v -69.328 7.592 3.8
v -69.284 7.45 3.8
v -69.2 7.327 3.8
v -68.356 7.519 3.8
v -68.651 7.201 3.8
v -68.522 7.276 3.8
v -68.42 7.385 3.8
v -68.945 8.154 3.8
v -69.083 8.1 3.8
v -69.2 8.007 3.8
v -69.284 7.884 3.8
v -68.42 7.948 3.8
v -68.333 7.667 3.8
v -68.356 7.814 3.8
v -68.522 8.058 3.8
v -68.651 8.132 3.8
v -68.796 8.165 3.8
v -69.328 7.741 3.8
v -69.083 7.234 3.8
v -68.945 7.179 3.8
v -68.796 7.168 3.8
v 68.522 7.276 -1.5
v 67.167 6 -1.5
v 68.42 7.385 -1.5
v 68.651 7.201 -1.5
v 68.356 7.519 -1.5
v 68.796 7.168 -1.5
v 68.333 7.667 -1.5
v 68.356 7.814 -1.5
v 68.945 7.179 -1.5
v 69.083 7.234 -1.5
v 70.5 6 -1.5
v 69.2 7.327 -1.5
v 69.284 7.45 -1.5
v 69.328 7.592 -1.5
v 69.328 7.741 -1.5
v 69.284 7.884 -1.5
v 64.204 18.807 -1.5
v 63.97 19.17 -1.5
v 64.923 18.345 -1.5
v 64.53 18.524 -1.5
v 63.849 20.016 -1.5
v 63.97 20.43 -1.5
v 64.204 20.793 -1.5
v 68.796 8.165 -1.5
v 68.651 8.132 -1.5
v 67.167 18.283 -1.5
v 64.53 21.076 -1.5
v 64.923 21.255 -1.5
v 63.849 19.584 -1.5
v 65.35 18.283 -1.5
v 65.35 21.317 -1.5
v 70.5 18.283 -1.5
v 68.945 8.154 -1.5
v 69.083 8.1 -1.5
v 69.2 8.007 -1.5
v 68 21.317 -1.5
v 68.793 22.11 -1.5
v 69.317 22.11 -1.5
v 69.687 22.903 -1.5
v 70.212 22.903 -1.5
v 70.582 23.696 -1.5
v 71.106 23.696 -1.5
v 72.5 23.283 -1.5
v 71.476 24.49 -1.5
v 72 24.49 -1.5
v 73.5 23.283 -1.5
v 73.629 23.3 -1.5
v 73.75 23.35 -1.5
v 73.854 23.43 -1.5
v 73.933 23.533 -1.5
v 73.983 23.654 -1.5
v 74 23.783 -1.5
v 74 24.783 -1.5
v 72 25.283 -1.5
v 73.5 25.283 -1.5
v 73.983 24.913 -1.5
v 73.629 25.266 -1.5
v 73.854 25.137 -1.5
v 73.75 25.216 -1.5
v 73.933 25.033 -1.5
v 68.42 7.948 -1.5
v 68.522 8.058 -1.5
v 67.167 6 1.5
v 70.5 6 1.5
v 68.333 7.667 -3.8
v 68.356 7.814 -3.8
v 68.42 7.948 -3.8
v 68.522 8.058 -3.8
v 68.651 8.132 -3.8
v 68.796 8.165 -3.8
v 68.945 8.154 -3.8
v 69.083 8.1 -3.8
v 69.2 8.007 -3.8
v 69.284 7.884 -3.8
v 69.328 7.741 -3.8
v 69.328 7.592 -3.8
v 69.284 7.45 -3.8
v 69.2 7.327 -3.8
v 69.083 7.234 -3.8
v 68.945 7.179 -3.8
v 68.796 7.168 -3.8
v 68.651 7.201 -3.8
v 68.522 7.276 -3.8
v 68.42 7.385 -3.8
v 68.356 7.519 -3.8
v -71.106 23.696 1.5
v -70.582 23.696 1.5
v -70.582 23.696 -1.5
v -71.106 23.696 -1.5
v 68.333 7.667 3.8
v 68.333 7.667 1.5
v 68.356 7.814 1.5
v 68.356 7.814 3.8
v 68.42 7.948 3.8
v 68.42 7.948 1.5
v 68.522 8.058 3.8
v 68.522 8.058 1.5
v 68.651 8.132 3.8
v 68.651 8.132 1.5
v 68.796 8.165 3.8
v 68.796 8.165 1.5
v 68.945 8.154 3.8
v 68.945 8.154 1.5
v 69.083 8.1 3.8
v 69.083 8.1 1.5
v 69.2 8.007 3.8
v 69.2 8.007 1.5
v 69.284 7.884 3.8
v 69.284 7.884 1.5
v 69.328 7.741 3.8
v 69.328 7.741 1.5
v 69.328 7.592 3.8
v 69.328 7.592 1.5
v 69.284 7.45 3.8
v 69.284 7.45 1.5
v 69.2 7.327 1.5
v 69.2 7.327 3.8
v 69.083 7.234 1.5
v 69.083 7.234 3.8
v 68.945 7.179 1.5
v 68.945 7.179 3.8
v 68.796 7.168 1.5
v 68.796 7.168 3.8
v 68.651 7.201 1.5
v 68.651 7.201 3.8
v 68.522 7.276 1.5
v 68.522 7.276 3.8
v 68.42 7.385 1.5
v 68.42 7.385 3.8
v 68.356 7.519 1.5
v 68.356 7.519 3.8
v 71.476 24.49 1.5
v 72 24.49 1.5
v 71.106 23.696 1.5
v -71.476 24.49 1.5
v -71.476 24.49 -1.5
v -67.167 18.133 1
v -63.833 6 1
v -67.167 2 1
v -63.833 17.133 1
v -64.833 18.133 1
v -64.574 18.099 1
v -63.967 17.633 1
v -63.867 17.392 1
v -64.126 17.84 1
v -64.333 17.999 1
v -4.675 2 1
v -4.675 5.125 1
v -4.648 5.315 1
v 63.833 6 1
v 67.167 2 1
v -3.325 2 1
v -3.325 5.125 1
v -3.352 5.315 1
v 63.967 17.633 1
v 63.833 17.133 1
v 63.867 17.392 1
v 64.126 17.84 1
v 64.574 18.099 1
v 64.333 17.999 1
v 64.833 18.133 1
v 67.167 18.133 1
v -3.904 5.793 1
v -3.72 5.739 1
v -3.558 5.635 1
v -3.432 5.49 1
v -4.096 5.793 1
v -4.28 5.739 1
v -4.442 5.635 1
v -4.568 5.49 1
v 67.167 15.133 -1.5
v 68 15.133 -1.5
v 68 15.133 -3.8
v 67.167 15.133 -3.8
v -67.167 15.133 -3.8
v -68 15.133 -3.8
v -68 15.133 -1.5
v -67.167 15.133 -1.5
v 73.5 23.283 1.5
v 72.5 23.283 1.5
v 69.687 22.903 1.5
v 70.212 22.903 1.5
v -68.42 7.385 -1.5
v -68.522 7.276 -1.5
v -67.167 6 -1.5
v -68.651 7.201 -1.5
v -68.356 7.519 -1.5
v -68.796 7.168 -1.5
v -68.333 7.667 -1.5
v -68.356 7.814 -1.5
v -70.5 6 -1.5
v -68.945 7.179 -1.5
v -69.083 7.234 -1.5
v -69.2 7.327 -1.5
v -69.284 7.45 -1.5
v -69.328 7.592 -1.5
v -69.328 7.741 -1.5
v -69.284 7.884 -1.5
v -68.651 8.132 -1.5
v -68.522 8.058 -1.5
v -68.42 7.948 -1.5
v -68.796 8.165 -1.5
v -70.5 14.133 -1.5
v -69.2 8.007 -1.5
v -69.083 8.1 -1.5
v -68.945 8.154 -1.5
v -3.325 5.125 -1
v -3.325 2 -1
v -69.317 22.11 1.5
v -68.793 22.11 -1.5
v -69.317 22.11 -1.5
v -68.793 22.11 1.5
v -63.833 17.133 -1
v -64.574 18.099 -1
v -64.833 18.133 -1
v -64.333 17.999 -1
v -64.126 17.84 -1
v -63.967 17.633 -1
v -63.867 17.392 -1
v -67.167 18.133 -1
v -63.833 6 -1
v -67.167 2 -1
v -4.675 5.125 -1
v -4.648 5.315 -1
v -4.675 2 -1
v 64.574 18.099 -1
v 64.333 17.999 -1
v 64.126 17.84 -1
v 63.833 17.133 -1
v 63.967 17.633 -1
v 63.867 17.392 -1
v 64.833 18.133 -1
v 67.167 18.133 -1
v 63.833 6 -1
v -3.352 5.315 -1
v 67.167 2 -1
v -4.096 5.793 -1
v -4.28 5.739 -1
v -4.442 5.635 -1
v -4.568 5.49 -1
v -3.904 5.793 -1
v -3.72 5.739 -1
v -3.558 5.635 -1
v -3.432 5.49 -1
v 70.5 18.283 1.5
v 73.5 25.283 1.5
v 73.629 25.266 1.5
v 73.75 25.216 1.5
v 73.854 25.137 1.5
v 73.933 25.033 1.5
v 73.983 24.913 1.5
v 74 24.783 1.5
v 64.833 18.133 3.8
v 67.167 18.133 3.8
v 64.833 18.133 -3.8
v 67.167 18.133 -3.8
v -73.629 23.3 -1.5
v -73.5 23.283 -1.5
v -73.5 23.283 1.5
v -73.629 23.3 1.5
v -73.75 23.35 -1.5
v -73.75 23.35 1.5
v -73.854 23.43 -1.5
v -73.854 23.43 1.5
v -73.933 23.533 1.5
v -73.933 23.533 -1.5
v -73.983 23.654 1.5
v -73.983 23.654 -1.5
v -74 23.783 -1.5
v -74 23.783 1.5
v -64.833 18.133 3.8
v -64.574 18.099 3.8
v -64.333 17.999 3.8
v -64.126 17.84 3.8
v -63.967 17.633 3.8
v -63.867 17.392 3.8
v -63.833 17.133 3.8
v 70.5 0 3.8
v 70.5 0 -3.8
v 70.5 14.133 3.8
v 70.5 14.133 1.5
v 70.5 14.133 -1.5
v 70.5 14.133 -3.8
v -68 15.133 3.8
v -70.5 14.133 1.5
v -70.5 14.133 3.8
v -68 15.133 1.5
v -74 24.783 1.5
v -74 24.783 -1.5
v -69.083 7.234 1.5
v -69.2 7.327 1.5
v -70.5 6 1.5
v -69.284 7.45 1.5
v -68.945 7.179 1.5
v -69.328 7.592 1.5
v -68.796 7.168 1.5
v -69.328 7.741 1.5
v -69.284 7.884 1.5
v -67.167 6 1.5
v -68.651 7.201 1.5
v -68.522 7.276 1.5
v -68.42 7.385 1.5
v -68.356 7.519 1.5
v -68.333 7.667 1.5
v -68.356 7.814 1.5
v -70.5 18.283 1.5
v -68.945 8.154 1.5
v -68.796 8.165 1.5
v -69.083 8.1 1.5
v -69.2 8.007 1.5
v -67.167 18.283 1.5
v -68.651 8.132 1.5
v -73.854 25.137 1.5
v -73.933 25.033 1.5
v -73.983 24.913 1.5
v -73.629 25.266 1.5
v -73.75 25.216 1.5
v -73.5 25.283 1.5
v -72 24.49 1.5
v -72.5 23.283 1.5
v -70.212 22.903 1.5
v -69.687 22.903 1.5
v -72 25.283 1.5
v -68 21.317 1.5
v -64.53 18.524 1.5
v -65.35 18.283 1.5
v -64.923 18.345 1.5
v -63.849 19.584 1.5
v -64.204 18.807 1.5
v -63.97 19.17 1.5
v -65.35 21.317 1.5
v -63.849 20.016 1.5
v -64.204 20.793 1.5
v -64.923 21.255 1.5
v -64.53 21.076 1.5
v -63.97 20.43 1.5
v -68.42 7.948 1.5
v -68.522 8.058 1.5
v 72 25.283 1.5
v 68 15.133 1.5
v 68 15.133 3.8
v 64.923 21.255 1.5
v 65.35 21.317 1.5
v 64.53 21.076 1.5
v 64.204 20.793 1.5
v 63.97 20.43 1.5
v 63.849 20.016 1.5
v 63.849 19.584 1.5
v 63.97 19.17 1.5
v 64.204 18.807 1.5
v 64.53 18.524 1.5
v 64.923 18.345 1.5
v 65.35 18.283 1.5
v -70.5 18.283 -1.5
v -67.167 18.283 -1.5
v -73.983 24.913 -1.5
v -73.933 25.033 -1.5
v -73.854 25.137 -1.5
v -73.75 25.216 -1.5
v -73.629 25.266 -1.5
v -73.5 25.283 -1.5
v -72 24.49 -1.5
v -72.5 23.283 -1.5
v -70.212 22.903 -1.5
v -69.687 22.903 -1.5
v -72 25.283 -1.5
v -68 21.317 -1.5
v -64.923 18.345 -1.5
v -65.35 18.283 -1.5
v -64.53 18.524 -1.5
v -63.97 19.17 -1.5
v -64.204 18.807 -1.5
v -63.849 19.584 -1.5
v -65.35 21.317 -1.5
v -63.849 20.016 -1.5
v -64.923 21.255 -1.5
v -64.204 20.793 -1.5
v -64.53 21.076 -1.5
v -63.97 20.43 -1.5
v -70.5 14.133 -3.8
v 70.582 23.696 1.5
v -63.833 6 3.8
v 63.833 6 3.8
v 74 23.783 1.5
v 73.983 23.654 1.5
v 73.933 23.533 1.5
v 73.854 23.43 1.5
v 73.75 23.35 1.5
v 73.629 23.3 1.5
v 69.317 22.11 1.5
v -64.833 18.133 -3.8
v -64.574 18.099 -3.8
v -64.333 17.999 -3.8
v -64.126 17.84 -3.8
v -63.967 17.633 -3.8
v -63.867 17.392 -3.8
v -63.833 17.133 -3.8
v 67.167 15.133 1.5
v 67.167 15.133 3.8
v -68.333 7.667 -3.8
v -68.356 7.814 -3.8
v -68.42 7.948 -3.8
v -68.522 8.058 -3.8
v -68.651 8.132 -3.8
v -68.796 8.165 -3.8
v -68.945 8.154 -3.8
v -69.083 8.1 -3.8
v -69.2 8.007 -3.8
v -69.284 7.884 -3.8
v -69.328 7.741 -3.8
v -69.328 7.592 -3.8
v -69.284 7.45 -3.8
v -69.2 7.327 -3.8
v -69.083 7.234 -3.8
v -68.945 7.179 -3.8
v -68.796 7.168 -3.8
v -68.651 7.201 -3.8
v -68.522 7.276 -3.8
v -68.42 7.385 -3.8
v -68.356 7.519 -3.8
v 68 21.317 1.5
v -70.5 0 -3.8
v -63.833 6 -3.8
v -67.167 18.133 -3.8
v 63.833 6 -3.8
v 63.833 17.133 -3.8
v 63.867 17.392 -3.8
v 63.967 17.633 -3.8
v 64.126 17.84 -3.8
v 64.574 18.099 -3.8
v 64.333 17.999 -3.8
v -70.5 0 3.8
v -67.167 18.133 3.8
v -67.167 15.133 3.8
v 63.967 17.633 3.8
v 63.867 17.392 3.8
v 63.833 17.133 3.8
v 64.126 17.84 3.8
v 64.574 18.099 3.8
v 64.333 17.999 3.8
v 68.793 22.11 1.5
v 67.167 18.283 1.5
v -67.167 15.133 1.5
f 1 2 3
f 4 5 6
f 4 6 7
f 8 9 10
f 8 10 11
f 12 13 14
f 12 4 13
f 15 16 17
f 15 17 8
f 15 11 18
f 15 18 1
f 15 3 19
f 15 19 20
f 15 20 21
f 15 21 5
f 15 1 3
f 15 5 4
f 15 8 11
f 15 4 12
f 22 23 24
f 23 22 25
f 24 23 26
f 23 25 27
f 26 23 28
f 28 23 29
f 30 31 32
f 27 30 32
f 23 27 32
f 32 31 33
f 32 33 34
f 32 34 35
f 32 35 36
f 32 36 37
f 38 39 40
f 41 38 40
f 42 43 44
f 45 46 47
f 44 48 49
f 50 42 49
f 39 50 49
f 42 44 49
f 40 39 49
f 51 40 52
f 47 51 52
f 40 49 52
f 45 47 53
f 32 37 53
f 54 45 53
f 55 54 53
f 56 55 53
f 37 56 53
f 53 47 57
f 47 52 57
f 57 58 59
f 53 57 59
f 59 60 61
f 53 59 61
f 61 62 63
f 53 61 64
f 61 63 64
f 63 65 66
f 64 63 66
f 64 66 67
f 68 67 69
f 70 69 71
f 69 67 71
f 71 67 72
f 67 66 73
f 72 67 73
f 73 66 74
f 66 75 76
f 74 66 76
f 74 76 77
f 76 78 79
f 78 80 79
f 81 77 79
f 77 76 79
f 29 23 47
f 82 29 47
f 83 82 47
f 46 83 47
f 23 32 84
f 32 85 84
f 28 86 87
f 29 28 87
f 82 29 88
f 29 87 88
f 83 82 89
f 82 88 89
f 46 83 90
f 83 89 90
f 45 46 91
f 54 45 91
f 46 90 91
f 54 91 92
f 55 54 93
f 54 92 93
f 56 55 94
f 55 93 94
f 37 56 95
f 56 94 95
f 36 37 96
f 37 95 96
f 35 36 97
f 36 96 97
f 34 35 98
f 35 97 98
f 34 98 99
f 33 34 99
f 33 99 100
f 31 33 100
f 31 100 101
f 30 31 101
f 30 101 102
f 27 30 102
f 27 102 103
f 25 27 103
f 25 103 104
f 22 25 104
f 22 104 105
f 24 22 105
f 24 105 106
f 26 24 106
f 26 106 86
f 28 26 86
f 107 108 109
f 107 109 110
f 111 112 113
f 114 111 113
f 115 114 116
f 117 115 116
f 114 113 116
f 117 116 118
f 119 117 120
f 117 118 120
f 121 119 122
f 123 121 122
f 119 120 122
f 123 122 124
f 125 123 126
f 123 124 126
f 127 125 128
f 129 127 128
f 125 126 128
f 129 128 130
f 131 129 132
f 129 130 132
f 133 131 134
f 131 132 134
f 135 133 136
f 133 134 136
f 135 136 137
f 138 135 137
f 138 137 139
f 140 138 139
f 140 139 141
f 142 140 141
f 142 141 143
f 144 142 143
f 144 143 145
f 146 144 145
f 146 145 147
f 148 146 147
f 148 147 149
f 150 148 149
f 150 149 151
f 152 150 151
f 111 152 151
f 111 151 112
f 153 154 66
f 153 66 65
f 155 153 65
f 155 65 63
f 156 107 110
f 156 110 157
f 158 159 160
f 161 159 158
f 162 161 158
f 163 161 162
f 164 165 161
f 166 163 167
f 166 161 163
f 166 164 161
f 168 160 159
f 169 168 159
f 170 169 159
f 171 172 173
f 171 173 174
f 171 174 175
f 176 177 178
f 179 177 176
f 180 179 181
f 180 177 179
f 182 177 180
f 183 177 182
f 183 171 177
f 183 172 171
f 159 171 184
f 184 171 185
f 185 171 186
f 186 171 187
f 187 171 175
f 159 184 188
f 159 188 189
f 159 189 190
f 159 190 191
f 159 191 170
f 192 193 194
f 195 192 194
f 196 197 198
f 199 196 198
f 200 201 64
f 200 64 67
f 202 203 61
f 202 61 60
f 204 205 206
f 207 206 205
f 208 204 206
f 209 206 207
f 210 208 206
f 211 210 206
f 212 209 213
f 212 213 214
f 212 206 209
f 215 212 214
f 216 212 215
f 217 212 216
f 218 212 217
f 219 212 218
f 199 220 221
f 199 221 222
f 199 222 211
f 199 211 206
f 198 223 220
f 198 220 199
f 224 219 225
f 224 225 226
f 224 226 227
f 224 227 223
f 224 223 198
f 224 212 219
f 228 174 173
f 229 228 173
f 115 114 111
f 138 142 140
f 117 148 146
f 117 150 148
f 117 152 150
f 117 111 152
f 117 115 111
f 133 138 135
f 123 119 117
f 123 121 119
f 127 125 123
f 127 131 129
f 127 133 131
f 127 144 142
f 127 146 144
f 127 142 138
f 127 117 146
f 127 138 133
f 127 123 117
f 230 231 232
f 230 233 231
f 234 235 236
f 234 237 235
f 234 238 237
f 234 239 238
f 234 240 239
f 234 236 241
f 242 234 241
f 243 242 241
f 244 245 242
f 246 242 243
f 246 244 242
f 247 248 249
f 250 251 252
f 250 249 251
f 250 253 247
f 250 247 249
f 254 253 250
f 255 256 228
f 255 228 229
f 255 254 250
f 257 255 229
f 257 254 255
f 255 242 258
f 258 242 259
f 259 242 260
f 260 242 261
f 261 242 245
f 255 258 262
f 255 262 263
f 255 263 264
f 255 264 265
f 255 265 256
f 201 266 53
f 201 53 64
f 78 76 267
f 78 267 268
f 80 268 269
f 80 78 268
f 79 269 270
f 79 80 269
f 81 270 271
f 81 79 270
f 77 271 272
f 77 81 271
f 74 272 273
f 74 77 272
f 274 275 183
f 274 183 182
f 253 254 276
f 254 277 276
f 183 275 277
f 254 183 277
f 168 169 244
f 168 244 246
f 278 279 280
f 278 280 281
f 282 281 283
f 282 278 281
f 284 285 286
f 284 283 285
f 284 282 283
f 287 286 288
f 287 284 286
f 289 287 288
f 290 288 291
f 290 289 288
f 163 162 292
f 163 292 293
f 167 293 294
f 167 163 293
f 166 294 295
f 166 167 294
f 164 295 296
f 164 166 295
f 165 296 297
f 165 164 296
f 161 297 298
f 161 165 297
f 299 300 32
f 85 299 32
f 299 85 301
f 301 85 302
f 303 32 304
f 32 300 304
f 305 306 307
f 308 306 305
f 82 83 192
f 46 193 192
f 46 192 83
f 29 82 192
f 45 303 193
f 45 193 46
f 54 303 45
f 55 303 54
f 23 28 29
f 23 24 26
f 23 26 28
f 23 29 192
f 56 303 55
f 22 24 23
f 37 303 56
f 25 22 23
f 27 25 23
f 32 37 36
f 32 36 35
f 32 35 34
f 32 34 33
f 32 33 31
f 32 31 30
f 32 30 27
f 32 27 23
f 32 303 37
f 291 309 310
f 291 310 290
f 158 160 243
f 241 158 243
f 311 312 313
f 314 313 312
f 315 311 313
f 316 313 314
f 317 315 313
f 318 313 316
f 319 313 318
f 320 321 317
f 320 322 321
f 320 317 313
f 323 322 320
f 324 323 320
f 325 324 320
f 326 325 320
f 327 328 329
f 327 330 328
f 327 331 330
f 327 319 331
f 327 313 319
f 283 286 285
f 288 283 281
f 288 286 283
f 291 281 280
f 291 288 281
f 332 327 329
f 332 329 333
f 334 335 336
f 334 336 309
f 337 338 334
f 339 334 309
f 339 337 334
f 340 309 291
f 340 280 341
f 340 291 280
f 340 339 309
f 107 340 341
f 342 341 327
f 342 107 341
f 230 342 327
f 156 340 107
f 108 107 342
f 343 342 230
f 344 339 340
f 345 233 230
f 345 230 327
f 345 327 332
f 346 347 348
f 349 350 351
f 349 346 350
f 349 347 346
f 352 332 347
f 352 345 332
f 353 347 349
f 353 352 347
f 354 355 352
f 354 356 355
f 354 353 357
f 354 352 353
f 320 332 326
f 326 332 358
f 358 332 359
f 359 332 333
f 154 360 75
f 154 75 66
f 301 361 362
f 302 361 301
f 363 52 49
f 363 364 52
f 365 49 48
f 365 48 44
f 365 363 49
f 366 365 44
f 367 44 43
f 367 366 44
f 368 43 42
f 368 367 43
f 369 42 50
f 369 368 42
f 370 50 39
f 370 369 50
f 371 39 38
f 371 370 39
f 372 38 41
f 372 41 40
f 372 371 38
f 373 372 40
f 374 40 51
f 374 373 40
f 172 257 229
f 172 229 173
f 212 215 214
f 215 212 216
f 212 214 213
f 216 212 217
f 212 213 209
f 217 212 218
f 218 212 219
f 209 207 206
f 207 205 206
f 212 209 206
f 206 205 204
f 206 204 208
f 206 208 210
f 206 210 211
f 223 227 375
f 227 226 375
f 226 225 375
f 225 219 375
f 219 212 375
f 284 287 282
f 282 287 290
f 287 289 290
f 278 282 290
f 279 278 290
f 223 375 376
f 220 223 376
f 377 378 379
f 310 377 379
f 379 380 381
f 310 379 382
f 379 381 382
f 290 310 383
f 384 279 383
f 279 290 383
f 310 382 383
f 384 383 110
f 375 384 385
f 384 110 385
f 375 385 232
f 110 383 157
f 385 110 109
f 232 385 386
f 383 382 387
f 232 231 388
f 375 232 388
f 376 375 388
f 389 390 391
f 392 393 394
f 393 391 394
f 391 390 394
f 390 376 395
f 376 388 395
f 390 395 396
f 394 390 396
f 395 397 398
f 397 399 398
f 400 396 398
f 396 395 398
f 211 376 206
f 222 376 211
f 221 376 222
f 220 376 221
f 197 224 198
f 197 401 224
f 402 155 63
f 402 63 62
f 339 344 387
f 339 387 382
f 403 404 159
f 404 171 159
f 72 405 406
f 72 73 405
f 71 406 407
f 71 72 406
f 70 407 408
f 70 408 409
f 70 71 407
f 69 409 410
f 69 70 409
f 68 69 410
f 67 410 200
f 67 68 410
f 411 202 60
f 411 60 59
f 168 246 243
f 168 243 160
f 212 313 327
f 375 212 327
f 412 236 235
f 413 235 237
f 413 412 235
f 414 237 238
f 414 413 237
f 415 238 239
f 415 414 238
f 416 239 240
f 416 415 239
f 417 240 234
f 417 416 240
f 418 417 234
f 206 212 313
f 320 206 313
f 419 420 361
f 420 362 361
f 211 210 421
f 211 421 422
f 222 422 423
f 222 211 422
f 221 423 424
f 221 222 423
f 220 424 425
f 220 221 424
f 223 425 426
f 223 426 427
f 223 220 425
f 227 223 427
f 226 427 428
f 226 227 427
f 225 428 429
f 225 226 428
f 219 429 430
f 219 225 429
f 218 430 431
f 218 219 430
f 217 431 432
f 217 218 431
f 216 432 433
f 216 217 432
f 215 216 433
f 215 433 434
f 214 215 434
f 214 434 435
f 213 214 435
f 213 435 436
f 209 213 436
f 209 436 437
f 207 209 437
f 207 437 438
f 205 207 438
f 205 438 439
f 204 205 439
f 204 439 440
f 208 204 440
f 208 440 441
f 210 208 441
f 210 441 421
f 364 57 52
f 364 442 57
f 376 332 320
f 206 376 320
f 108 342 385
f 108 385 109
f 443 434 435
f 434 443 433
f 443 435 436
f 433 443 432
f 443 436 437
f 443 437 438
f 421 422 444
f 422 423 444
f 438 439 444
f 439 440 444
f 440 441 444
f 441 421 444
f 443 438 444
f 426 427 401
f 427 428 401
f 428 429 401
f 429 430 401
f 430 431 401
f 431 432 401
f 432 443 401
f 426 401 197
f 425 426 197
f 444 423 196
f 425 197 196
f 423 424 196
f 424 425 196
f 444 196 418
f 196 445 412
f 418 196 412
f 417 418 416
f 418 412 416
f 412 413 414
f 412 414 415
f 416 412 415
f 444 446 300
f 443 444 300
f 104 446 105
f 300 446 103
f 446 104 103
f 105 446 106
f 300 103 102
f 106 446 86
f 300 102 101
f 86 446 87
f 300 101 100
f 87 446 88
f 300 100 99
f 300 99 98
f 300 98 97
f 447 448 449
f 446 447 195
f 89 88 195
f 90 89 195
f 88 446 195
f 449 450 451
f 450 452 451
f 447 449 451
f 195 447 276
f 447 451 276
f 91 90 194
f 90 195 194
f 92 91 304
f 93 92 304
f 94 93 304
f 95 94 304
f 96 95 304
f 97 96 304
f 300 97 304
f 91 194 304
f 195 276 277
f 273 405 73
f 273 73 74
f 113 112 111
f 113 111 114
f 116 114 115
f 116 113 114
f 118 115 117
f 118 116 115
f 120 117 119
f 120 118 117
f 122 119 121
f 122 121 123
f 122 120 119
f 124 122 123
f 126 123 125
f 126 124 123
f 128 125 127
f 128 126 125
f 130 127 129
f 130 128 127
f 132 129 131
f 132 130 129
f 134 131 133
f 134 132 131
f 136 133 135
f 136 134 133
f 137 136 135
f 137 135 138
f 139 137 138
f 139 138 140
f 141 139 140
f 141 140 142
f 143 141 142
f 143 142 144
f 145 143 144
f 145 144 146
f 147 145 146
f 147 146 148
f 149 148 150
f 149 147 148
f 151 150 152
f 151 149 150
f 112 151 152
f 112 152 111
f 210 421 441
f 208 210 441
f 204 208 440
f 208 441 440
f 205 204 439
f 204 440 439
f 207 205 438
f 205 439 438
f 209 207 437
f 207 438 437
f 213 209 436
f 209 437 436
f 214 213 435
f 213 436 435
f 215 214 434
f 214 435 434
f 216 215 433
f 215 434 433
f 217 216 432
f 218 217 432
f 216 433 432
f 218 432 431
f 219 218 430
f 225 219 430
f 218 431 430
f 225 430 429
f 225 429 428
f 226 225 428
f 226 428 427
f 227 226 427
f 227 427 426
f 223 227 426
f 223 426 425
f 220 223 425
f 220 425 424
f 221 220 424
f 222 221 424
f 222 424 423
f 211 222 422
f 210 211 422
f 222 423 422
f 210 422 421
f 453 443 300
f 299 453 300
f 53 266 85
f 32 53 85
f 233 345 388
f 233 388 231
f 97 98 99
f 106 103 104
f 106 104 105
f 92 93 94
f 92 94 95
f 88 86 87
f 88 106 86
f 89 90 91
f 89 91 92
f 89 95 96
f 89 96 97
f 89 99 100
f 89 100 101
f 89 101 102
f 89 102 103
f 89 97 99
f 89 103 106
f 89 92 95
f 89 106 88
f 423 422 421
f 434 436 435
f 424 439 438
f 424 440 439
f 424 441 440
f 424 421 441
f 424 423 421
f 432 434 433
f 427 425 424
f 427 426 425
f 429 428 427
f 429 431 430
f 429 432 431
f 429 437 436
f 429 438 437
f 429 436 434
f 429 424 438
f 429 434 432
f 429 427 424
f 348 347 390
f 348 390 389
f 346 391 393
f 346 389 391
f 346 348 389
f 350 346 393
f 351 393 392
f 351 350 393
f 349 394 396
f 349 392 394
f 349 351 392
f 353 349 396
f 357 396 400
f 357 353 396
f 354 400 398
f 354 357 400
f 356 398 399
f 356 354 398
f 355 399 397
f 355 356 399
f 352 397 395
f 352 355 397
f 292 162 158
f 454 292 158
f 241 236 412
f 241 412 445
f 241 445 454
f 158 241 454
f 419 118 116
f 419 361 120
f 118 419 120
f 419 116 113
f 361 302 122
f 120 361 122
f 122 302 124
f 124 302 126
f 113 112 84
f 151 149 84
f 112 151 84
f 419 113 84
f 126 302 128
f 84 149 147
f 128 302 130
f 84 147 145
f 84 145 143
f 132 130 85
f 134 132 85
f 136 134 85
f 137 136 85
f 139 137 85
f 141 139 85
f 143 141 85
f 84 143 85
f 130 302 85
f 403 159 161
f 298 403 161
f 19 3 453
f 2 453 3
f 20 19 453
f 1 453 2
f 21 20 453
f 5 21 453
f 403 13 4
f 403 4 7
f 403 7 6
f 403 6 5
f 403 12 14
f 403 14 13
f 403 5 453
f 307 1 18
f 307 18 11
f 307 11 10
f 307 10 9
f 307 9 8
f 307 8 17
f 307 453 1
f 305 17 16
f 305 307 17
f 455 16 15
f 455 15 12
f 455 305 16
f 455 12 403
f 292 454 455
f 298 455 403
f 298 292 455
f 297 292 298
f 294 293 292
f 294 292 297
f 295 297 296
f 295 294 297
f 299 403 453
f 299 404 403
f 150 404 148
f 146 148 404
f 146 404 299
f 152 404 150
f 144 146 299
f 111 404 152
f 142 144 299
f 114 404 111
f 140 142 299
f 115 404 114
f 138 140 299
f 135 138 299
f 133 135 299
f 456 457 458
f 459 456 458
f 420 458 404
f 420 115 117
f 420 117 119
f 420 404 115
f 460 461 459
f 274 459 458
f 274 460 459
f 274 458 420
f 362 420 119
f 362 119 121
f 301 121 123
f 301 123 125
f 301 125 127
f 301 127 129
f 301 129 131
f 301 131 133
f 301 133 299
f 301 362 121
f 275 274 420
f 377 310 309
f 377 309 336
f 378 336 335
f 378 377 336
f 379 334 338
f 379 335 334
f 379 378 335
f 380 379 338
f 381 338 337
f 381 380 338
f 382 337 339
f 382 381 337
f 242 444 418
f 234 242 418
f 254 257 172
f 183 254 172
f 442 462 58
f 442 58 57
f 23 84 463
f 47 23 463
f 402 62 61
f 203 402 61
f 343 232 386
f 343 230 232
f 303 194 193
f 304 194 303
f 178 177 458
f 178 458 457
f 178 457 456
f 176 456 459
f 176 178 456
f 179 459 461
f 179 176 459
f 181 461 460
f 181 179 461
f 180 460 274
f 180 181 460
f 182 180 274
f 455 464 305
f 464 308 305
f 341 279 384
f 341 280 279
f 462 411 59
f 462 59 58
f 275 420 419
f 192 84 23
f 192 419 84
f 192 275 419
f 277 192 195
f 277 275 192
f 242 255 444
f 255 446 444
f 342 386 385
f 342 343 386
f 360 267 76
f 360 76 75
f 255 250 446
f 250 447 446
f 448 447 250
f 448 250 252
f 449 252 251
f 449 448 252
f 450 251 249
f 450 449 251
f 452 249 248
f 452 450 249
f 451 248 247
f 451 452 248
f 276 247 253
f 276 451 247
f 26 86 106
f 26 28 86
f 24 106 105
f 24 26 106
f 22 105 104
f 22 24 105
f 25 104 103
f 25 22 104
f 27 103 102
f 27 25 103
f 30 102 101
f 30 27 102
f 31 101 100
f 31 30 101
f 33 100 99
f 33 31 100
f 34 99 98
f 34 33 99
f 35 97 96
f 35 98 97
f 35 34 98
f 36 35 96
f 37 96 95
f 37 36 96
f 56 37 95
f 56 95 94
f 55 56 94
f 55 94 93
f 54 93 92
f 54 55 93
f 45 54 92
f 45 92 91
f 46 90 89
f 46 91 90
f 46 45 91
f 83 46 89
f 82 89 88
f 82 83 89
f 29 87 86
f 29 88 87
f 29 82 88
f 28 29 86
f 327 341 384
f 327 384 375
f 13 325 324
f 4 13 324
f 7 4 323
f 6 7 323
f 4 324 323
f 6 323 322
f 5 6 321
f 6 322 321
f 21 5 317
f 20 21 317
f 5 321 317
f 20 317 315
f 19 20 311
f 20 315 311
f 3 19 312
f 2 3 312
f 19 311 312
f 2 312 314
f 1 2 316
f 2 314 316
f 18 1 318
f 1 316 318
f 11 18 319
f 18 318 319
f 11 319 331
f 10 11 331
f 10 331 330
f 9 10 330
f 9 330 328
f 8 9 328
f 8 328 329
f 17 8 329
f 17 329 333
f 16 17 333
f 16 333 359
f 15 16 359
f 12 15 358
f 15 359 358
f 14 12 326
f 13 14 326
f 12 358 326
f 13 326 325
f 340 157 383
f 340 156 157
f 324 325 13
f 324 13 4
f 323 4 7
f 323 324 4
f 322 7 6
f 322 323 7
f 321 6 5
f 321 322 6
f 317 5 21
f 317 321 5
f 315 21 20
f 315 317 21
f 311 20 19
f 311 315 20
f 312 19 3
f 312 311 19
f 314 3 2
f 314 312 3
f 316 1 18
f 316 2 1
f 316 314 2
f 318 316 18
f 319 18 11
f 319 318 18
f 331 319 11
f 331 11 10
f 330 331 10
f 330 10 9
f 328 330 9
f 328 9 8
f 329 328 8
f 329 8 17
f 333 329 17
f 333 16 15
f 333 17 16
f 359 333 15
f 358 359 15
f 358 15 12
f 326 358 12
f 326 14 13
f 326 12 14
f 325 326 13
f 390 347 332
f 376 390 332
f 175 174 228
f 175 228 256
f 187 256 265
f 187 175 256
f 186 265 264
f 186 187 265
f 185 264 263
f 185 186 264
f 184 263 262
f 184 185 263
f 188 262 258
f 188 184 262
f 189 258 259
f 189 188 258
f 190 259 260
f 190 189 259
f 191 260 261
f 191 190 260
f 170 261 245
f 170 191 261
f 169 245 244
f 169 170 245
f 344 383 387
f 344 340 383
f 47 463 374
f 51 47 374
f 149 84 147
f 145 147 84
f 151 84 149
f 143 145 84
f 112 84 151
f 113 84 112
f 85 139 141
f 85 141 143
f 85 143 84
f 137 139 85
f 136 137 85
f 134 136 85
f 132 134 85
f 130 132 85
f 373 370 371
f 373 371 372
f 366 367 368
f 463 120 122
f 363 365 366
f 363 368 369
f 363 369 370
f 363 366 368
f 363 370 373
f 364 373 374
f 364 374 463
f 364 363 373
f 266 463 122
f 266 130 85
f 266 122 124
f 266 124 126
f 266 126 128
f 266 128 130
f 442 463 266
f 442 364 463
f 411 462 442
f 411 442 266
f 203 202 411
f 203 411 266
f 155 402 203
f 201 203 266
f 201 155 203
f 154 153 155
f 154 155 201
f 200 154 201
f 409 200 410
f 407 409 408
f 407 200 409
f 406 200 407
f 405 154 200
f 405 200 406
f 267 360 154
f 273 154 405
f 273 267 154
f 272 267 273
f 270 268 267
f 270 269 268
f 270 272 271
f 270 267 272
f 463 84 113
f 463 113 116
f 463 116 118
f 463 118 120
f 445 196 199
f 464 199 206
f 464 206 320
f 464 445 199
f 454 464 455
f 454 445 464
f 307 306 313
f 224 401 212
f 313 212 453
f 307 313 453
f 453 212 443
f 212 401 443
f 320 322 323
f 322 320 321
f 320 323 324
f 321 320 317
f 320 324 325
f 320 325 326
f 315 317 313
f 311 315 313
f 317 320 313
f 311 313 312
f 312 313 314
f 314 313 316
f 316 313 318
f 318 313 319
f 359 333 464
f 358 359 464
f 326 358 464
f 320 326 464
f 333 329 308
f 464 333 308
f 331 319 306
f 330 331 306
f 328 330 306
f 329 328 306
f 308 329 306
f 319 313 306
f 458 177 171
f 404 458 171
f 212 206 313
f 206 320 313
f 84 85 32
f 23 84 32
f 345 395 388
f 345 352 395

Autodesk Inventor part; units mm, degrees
ref_plane "YZ Plane" through (0, 0, 0) normal (1, 0, 0) x (0, 1, 0)
ref_plane "XZ Plane" through (0, 0, 0) normal (0, 1, 0) x (-1, 0, 0)
ref_plane "XY Plane" through (0, 0, 0) normal (0, 0, 1) x (1, 0, 0)
sketch "Sketch1" plane through (0, 0, 0) normal (0, 0, 1) x (1, 0, 0)
  line L0 (-70.5, 18.1333) -> (-70.5, 0)
  line L1 (-70.5, 0) -> (70.5, 0)
  line L2 (70.5, 0) -> (70.5, 18.1333)
  line L3 (70.5, 18.1333) -> (63.8333, 18.1333)
  line L4 (63.8333, 18.1333) -> (63.8333, 6)
  line L5 (63.8333, 6) -> (-63.8333, 6)
  line L6 (-63.8333, 6) -> (-63.8333, 18.1333)
  line L7 (-63.8333, 18.1333) -> (-70.5, 18.1333)
  point P0 (0, 0)
  point P1 (0, 0)
  dimension "d0" = 6.6667
  dimension "d1" = 141
  dimension "d2" = 6
  dimension "d3" = 18.1333
extrude "Extrusion1" add sketch "Sketch1" along normal mid plane 7.6
sketch "Sketch2" plane through (70.5, 0, 3.8) normal (1, 0, 0) x (0, 0, -1)
  line L0 (2.3, 15.1333) -> (2.3, 6)
  line L1 (0, 15.1333) -> (2.3, 15.1333)
  line L2 (5.3, 15.1333) -> (5.3, 6)
  line L3 (5.3, 15.1333) -> (7.6, 15.1333)
  line L4 (7.6, 18.1333) -> (0, 18.1333) projected
  line L5 (0, 0) -> (0, 18.1333) projected
  line L6 (7.6, 18.1333) -> (0, 18.1333) projected
  line L7 (0, 0) -> (0, 18.1333) projected
  line L8 (7.6, 0) -> (0, 0) projected
  line L9 (7.6, 18.1333) -> (7.6, 0) projected
  line L10 (7.6, 18.1333) -> (7.6, 0) projected
  line L11 (7.6, 0) -> (0, 0) projected
  line L12 (2.3, 6) -> (5.3, 6)
  line L13 (7.6, 15.1333) -> (7.6, 18.1333)
  line L14 (7.6, 18.1333) -> (0, 18.1333)
  line L15 (0, 15.1333) -> (0, 18.1333)
  point P0 (3.8, 0)
  point P1 (3.8, 6)
  point P2 (3.8, 0)
  dimension "d6" = 3
  dimension "d7" = 3
  dimension "d8" = 6
extrude "Extrusion2" cut sketch "Sketch2" against normal blind 3.3333 contours L1 L5 L4 L9 L3 L2 L12 L0
sketch "Sketch3" plane through (0, 0, -3.8) normal (0, 0, -1) x (-1, 0, 0)
  line L0 (-70.5, 15.1333) -> (-67.1667, 15.1333) projected
  line L1 (-68, 15.1333) -> (-70.5, 14.1333)
  line L2 (-70.5, 15.1333) -> (-70.5, 6) projected
  line L3 (-70.5, 14.1333) -> (-70.5, 15.1333)
  line L4 (-70.5, 15.1333) -> (-68, 15.1333)
  point P0 (0, 0)
  dimension "d11" = 2.5
  dimension "d12" = 1
extrude "Extrusion3" cut sketch "Sketch3" against normal through all
sketch "Sketch4" plane through (0, 0, -3.8) normal (0, 0, -1) x (-1, 0, 0)
  circle A0 centre (-68.8333, 7.6667) radius 0.5
  line L0 (-70.5, 0) -> (-70.5, 14.1333) projected
  line L1 (-70.5, 14.1333) -> (-67.1667, 14.1333) construction
  line L2 (-70.5, 6) -> (-67.1667, 6) projected
  line L3 (-67.1667, 15.1333) -> (-67.1667, 6) projected
  point P0 (0, 0)
  point P1 (-68.8333, 14.1333)
  dimension "d15" = 1
  dimension "d16" = 1.6667
extrude "Extrusion4" cut sketch "Sketch4" against normal through all
fillet "Fillet2" radius 1 1 edges at (63.8333, 18.1333, 0)
sketch "Sketch7" plane through (63.8333, 6, -3.8) normal (-1, 0, 0) x (0, 0, 1)
  line L0 (2.8, 12.1333) -> (4.8, 12.1333)
  line L1 (4.8, 12.1333) -> (4.8, -4)
  line L2 (4.8, -4) -> (2.8, -4)
  line L3 (2.8, -4) -> (2.8, 12.1333)
  line L4 (0, 0) -> (7.6, 0) projected
  line L5 (0, 11.1333) -> (7.6, 11.1333) projected
  line L6 (7.6, 12.1333) -> (0, 12.1333) projected
  point P0 (3.8, -6)
  point P1 (3.8, -4)
  point P2 (3.8, 11.1333)
  dimension "d33" = 4
  dimension "d34" = 2
extrude "Extrusion7" cut sketch "Sketch7" against normal blind 3.3333
mirror "Mirror2" about plane through (0, 0, 0) normal (1, 0, 0) of "Extrusion2", "Extrusion3", "Extrusion4", "Fillet2", "Extrusion7"
sketch "Sketch5" plane through (0, 0, 0) normal (0, 0, 1) x (1, 0, 0)
  line L0 (70.5, 18.2833) -> (70.5, 6)
  line L1 (70.5, 6) -> (67.1667, 6)
  line L2 (67.1667, 6) -> (67.1667, 18.2833)
  line L3 (70.5, 18.2833) -> (72.5, 23.2833)
  line L4 (72.5, 23.2833) -> (74, 23.2833)
  line L5 (74, 23.2833) -> (74, 25.2833)
  line L6 (74, 25.2833) -> (72, 25.2833)
  line L7 (68, 21.3167) -> (65.35, 21.3167)
  line L8 (67.1667, 18.2833) -> (65.35, 18.2833)
  arc A0 (65.35, 21.3167) -> (65.35, 18.2833) centre (65.35, 19.8) ccw
  line L9 (63.8333, 18.1333) -> (67.1667, 18.1333) projected
  line L10 (70.5, 6) -> (67.1667, 6) projected
  line L11 (67.1667, 15.1333) -> (67.1667, 6) projected
  line L12 (70.5, 14.1333) -> (70.5, 0) projected
  line L13 (63.8333, 6) -> (63.8333, 18.1333) projected
  line L14 (70.5, 0) -> (-70.5, 0) projected
  line L15 (70.5, 0) -> (70.5, 14.1333) projected
  line L16 (70.5, 2) -> (-70.5, 2) construction
  line L17 (-70.5, 0) -> (-70.5, 18.1333) projected
  line L18 (-63.8333, 6) -> (63.8333, 6) projected
  line L19 (72, 25.2833) -> (72, 24.4899)
  line L20 (72, 24.4899) -> (71.4757, 24.4899)
  line L21 (71.4757, 24.4899) -> (71.1058, 23.6965)
  line L22 (71.1058, 23.6965) -> (70.5815, 23.6965)
  line L23 (70.5815, 23.6965) -> (70.2115, 22.9031)
  line L24 (70.2115, 22.9031) -> (69.6873, 22.9031)
  line L25 (69.6873, 22.9031) -> (69.3173, 22.1097)
  line L26 (69.3173, 22.1097) -> (68.7931, 22.1097)
  line L27 (68.7931, 22.1097) -> (68, 21.3167)
  point P0 (0, 0)
  point P1 (68, 15.1333)
  point P2 (-70.5, 14.1333)
  point P3 (66.2583, 18.2833)
  dimension "d19" = 0.15
  dimension "d22" = 4
  dimension "d23" = 17.8
  dimension "d42" = 5
  dimension "d43" = 1.5
  dimension "d44" = 2
  dimension "d45" = 2
  dimension "d46" = 90
  dimension "d49" = 0.7934
  dimension "d50" = 0.7934
  dimension "d51" = 0.7934
  dimension "d52" = 0.7934
  dimension "d53" = 135
  dimension "d54" = 2
  dimension "d55" = 115
extrude "Extrusion5" add sketch "Sketch5" against normal up to surface (3 mm away) from surface at 1.5 separate body
fillet "Fillet1" radius 0.5 2 edges at (74, 25.2833, 0) (74, 23.2833, 0)
sketch "Sketch6" plane through (70.5, 6, -1.5) normal (0, 0, -1) x (-1, 0, 0)
  circle A0 centre (1.6667, 1.6667) radius 0.5
  circle A1 centre (1.6667, 1.6667) radius 0.5 projected
  point P0 (70.5, -6)
extrude "Extrusion6" add sketch "Sketch6" along normal up to surface (2.3 mm away) bodies 2
mirror "Mirror4" about plane through (0, 0, 0) normal (0, 0, 1) of "Extrusion6" bodies 2
mirror "Mirror3" about plane through (0, 0, 0) normal (1, 0, 0) of "Extrusion5", "Fillet1", "Extrusion6", "Mirror4" bodies 2
sketch "Sketch8" plane through (-63.8333, 6, 3.8) normal (0, 1, 0) x (1, 0, 0)
  line L0 (127.6667, 2.8) -> (0, 2.8)
  line L1 (0, 2.8) -> (0, 4.8)
  line L2 (0, 4.8) -> (127.6667, 4.8)
  line L3 (127.6667, 4.8) -> (127.6667, 2.8)
  point P0 (63.8333, 3.8)
extrude "Extrusion8" cut sketch "Sketch8" against normal up to surface (4 mm away) bodies 1
sketch "Sketch9" plane through (0, 0, 0) normal (0, 0, 1) x (1, 0, 0)
  line L0 (67.1667, 2) -> (-67.1667, 2) projected
  line L1 (-3.325, 2) -> (-4.675, 2)
  line L2 (-4.675, 5.125) -> (-4.675, 2)
  line L3 (-3.325, 5.125) -> (-3.325, 2)
  arc A0 (-3.325, 5.125) -> (-4.675, 5.125) centre (-4, 5.125) ccw
  line L4 (-3.5, 5.8) -> (-4.5, 5.8) construction
  point P0 (0, 0)
  point P1 (-4, 5.8)
  dimension "d39" = 1.35
  dimension "d40" = 1
  dimension "d41" = 3.8
  dimension "d57" = 4
extrude "Extrusion9" add sketch "Sketch9" against normal up to surface (2 mm away) from surface at 1 bodies 1
properties part number "MO-237 10005639-11109LF"
